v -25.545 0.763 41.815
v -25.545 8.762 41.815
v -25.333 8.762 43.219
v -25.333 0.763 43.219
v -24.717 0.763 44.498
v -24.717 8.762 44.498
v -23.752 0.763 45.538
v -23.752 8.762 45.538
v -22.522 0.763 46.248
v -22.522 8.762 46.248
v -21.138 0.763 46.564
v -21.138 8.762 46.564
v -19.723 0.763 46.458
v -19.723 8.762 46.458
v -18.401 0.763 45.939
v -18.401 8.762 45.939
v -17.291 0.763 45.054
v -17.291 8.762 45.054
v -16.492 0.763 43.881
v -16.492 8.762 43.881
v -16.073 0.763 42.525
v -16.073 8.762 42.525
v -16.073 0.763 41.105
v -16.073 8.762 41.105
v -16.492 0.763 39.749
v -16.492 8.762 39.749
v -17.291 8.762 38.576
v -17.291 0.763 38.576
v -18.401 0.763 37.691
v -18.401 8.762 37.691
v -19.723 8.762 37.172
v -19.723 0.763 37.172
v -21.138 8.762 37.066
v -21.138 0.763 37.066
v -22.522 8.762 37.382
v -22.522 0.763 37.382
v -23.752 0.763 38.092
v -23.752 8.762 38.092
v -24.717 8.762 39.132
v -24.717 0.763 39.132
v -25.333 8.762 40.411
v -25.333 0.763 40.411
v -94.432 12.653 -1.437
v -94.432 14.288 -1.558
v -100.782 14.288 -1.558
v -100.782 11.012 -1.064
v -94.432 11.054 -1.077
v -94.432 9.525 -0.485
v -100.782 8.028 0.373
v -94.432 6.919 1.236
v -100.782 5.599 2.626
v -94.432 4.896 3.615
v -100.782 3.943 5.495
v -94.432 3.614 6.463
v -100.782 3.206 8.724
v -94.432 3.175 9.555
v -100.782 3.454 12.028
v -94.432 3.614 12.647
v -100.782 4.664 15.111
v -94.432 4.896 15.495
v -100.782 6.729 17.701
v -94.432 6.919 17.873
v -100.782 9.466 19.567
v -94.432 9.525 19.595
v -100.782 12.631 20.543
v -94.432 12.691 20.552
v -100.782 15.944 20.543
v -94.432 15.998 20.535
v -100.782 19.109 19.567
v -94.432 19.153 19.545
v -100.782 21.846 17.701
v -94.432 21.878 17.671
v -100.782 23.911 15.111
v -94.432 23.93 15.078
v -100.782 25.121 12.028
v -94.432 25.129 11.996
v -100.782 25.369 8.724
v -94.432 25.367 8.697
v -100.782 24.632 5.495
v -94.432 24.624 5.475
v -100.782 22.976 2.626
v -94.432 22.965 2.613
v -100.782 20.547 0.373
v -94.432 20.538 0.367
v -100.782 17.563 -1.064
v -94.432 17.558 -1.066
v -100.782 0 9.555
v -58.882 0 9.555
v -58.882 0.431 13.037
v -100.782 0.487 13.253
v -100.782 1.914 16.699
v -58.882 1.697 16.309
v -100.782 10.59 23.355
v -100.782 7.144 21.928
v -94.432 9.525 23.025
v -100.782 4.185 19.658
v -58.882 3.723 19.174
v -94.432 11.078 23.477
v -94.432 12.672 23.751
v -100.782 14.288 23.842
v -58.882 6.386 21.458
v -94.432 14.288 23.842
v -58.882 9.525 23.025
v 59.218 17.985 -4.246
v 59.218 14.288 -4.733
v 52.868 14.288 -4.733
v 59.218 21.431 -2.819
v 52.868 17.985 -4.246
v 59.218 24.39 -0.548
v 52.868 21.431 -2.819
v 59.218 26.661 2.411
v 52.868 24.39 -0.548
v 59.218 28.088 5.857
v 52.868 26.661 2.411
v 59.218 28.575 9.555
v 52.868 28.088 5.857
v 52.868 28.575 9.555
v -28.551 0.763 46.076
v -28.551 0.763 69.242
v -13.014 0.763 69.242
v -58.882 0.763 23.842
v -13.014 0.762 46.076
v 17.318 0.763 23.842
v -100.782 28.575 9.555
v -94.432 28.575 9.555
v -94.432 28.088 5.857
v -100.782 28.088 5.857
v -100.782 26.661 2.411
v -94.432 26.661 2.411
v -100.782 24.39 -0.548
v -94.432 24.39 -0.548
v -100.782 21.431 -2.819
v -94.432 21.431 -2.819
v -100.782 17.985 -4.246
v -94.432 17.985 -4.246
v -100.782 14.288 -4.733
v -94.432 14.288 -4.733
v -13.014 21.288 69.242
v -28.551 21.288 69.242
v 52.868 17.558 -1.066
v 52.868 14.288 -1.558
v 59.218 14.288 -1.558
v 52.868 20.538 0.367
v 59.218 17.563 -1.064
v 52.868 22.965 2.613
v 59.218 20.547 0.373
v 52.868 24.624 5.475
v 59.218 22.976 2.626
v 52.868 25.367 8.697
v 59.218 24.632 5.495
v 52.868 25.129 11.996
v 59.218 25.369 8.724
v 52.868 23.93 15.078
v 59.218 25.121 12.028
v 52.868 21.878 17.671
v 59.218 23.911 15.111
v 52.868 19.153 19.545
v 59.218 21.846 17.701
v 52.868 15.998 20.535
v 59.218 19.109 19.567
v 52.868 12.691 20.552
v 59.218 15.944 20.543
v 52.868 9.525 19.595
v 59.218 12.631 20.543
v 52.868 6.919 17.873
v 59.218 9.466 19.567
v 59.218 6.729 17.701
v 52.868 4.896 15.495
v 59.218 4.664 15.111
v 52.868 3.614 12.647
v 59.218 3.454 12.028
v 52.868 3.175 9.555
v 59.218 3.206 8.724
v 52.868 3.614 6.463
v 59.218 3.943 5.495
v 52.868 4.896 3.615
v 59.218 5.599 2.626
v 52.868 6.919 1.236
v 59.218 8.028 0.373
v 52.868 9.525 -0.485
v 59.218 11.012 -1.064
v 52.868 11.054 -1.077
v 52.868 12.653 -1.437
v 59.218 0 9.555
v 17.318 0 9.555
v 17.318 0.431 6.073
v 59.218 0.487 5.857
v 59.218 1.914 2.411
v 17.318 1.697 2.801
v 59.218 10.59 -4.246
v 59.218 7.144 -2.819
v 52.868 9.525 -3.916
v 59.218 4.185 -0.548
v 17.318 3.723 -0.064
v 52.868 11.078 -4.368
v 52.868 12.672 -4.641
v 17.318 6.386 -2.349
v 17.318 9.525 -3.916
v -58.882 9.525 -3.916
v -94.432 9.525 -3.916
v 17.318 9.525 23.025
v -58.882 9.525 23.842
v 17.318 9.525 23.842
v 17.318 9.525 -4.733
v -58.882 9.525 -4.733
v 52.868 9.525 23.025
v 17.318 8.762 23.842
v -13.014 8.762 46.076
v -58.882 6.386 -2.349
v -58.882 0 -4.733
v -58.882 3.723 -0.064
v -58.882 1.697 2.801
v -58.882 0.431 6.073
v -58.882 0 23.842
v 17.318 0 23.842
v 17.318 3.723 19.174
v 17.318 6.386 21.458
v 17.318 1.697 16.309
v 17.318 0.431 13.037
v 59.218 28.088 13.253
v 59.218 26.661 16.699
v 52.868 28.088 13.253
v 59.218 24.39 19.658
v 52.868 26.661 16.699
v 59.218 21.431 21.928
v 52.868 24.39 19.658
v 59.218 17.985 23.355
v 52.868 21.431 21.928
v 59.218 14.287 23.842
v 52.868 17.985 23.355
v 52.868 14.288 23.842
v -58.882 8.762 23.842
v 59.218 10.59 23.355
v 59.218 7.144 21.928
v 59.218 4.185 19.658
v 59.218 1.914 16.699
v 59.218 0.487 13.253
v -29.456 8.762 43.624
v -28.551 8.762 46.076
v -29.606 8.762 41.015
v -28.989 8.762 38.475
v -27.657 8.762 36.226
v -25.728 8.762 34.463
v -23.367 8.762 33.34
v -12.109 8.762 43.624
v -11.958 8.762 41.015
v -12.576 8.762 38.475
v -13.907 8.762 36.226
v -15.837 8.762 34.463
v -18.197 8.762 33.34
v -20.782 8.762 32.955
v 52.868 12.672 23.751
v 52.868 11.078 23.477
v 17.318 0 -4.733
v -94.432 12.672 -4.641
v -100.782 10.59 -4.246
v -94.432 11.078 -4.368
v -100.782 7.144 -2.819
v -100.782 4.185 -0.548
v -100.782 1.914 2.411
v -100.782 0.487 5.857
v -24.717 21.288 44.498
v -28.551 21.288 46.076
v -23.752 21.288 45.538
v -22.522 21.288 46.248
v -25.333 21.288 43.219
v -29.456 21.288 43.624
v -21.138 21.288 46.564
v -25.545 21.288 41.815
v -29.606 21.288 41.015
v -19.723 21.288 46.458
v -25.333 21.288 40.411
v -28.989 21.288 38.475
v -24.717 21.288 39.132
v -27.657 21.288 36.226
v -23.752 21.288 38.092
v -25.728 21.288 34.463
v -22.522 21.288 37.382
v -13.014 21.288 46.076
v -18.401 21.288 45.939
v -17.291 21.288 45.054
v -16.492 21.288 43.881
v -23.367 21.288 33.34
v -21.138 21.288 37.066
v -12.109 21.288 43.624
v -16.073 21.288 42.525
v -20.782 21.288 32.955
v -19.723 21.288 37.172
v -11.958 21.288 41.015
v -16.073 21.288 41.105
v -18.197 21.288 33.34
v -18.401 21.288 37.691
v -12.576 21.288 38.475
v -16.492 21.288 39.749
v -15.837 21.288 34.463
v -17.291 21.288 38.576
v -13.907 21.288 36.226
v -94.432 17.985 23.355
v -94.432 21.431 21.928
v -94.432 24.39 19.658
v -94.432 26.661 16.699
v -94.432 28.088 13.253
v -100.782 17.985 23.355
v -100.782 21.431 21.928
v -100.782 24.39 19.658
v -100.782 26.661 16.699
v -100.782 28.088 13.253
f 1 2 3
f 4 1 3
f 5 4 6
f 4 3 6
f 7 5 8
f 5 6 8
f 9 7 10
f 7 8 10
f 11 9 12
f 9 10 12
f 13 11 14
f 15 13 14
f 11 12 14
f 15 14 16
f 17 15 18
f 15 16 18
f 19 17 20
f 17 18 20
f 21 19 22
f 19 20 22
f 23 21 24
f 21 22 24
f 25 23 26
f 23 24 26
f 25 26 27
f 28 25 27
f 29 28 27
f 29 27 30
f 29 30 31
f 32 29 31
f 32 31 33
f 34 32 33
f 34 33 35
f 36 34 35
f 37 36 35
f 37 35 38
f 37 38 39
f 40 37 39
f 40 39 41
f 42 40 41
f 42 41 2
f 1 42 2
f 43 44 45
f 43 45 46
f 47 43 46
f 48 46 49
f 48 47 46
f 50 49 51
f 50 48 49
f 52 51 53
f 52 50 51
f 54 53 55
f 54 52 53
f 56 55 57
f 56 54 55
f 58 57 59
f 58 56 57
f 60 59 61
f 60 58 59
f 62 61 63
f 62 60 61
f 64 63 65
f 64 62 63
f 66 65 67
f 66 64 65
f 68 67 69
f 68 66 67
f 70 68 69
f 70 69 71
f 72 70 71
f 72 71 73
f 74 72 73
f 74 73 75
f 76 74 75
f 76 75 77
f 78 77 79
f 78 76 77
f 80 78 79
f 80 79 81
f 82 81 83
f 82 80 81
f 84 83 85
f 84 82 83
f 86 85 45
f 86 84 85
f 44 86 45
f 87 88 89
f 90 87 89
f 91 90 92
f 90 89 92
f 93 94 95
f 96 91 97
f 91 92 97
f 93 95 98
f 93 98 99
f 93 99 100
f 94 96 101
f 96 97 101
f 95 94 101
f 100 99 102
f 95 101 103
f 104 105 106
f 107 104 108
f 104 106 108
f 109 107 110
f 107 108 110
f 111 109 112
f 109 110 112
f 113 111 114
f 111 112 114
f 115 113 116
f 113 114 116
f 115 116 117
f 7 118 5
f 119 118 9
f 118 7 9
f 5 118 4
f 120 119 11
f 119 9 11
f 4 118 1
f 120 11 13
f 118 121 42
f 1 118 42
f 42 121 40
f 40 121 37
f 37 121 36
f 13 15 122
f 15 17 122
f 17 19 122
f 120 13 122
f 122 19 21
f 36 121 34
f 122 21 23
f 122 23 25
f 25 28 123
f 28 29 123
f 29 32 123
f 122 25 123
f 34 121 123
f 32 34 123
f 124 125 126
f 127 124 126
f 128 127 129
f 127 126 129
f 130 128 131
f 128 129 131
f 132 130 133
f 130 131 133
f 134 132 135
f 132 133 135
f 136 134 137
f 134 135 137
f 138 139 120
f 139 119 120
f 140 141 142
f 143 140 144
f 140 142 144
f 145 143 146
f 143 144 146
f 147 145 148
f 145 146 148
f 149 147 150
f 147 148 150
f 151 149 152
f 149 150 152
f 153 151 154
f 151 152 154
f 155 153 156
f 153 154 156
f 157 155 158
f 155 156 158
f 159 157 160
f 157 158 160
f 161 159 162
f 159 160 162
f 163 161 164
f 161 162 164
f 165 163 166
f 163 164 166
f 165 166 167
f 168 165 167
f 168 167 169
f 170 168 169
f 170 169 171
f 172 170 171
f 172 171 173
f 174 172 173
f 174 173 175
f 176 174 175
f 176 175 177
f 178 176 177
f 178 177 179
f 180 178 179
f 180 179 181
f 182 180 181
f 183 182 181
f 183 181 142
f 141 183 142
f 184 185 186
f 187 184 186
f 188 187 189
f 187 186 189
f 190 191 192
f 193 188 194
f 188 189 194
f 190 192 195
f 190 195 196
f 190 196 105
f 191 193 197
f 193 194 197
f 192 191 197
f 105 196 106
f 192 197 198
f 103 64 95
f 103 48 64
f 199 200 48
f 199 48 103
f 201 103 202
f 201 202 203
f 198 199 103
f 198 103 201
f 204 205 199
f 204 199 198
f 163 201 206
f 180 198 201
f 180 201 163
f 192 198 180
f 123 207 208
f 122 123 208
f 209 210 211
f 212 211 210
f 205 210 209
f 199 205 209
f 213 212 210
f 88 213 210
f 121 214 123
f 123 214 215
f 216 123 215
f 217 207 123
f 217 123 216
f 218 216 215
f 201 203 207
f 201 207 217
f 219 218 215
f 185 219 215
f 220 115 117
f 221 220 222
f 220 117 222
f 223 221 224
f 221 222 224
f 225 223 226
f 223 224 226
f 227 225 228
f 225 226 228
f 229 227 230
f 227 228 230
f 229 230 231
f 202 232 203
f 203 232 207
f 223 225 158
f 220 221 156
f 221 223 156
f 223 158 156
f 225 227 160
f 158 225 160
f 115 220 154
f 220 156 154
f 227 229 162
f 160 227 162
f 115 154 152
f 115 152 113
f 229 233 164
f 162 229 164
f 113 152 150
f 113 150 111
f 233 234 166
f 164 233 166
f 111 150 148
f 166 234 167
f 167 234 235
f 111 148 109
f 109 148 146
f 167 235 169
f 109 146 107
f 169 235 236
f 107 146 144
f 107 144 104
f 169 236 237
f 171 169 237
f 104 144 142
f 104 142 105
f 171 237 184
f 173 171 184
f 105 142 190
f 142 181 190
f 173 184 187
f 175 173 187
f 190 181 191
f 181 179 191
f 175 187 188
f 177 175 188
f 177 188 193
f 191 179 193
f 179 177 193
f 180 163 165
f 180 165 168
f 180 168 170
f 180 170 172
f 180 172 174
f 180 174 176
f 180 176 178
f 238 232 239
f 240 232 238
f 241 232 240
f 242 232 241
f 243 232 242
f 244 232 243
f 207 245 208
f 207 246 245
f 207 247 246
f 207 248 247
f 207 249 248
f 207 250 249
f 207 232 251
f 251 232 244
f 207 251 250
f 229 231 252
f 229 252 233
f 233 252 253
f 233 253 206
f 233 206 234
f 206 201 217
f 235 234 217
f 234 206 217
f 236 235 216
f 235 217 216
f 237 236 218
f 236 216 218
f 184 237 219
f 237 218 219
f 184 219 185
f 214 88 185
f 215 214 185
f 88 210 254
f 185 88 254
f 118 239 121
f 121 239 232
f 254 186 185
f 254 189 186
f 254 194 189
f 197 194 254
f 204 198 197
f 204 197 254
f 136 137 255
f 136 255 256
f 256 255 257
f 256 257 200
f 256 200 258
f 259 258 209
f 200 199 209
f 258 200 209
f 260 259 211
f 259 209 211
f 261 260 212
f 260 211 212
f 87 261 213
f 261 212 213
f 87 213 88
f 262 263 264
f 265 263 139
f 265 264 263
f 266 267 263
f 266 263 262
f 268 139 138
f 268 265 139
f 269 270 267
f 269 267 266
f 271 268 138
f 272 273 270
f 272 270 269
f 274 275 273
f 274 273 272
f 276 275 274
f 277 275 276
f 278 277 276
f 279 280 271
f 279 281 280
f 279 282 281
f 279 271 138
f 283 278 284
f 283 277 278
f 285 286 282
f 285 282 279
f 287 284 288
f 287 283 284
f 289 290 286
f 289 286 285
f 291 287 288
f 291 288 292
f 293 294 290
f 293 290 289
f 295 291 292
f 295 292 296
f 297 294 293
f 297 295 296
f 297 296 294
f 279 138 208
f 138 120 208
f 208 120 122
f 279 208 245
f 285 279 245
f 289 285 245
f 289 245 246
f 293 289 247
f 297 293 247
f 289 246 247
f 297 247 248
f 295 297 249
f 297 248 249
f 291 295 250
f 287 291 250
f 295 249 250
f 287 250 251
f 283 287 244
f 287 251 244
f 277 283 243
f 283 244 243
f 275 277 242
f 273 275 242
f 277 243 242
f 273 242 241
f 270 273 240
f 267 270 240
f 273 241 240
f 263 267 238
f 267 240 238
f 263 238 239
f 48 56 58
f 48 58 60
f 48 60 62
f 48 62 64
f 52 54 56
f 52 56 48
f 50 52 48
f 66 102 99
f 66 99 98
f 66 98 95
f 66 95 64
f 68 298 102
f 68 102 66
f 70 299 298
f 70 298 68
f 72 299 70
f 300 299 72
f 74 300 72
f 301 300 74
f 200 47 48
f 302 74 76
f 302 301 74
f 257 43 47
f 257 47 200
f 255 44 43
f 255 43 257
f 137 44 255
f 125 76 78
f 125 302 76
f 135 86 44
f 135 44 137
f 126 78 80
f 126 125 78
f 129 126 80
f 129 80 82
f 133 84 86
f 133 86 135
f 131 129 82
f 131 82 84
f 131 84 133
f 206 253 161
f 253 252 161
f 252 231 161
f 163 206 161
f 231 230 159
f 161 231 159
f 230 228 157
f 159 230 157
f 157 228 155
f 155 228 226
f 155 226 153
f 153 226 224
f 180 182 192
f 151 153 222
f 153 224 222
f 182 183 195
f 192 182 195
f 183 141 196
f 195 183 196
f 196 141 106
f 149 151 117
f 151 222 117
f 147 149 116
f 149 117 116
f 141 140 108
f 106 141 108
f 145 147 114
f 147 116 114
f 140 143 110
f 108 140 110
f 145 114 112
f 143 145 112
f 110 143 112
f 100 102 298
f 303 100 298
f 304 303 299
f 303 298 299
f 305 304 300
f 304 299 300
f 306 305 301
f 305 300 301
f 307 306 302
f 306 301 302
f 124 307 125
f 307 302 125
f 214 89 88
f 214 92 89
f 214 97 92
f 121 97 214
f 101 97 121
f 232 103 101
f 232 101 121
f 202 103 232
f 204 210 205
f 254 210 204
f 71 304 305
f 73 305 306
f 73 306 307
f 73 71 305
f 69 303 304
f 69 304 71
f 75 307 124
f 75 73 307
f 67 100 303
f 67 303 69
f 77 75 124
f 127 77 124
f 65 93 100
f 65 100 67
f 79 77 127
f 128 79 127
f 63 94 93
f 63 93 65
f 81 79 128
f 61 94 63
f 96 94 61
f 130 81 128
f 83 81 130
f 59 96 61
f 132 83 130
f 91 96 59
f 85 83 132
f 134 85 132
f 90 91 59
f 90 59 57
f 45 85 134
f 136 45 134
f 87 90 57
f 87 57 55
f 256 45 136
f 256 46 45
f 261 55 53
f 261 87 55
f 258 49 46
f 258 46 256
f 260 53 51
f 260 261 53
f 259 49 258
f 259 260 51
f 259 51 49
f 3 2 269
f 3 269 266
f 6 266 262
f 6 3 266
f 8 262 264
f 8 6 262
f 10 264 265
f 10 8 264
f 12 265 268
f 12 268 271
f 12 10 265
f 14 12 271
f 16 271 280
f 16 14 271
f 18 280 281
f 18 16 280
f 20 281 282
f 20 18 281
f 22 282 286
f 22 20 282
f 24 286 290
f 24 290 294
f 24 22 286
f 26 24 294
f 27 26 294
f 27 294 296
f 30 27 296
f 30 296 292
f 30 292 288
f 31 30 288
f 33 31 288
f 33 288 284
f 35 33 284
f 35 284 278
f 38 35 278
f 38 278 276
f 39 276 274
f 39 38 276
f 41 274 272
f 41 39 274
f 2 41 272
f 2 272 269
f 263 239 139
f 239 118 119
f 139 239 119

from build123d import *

# Parameters (mm, degrees)
SKETCH1_W           = 160
SKETCH1_H           = 28.575
BOSS_EXTRUDE1_DEPTH = 28.575
SKETCH3_W           = 147.3
SKETCH3_H           = 28.575
CUT_EXTRUDE3_DEPTH  = 19.05
SKETCH4_W           = 76.2
SKETCH4_H           = 8
BOSS_EXTRUDE2_DEPTH = 45.4
CUT_EXTRUDE8_DEPTH  = 124.871382326
SKETCH9_R           = 4.7625
BOSS_EXTRUDE4_DEPTH = 12.525
SKETCH10_R          = 4.7625
CUT_EXTRUDE10_DEPTH = 124.871382326
CUT_EXTRUDE11_START = -41.9
SKETCH2_OUTSIDE_W   = 111.689
SKETCH2_OUTSIDE_H   = 66.289
SKETCH2_OUTSIDE_R   = 14.2875
CUT_EXTRUDE11_DEPTH = 41.9
CUT_EXTRUDE13_START = -41.9
SKETCH13_OUTSIDE_W  = 111.689
SKETCH13_OUTSIDE_H  = 66.289
SKETCH13_OUTSIDE_R  = 14.2875
CUT_EXTRUDE13_DEPTH = 41.9
SKETCH14_R          = 11.1125
CUT_EXTRUDE14_DEPTH = 6.35
CUT_EXTRUDE15_START = -6.35
SKETCH15_R          = 11.1125
CUT_EXTRUDE15_DEPTH = 6.35


with BuildPart() as part:
    # Sketch1 → Boss-Extrude1 (new body)
    with BuildSketch(Plane(origin=(0, 0, 0), x_dir=(1, 0, 0), z_dir=(0, 1, 0))):
        with Locations((-20.782379652, -9.554800327)):
            Rectangle(SKETCH1_W, SKETCH1_H)
    extrude(amount=BOSS_EXTRUDE1_DEPTH)

    # Sketch3 → Cut-Extrude3 (cut)
    with BuildSketch(Plane(origin=(0, 28.575, 0), x_dir=(1, 0, 0), z_dir=(0, 1, 0))):
        with Locations((-20.782379652, -9.554800327)):
            Rectangle(SKETCH3_W, SKETCH3_H)
    extrude(amount=-CUT_EXTRUDE3_DEPTH, mode=Mode.SUBTRACT)

    # Sketch4 → Boss-Extrude2 (add)
    with BuildSketch(Plane.XY.offset(23.842300327)):
        with Locations((-20.782379652, 4.7625)):
            Rectangle(SKETCH4_W, SKETCH4_H)
    extrude(amount=BOSS_EXTRUDE2_DEPTH)

    # Sketch5 → Cut-Extrude8 (cut, through all)
    with BuildSketch(Plane(origin=(0, 8.7625, 0), x_dir=(1, 0, 0), z_dir=(0, 1, 0))):
        Polygon((-13.013921372, -46.075787503), (-13.013921372, -69.242300327), (17.317620348, -69.242300327), (17.317620348, -23.842300327), align=None)
        Polygon((-28.550837933, -69.242300327), (-28.550837933, -46.075787503), (-58.882379652, -23.842300327), (-58.882379652, -69.242300327), align=None)
    extrude(amount=-CUT_EXTRUDE8_DEPTH, mode=Mode.SUBTRACT)

    # Sketch9 → Boss-Extrude4 (add)
    with BuildSketch(Plane(origin=(0, 8.7625, 0), x_dir=(1, 0, 0), z_dir=(0, 1, 0))):
        with BuildLine():
            Line((-28.550837933, -46.075787503), (-28.550837933, -69.242300327))
            Line((-28.550837933, -69.242300327), (-13.013921372, -69.242300327))
            Line((-13.013921372, -69.242300327), (-13.013921372, -46.075787503))
            ThreePointArc((-13.013921372, -46.075787503), (-20.782379652, -32.954800327), (-28.550837933, -46.075787503))
        make_face()
        with Locations(Location((-20.782379652, -41.815004419, 0), (0, 0, 180))):
            Circle(SKETCH9_R, mode=Mode.SUBTRACT)
    extrude(amount=BOSS_EXTRUDE4_DEPTH)

    # Sketch10 → Cut-Extrude10 (cut, through all)
    with BuildSketch(Plane(origin=(0, 8.7625, 0), x_dir=(1, 0, 0), z_dir=(0, 1, 0))):
        with Locations(Location((-20.782379652, -41.815004419, 0), (0, 0, 180))):
            Circle(SKETCH10_R)
    extrude(amount=-CUT_EXTRUDE10_DEPTH, mode=Mode.SUBTRACT)

    # Sketch2 outside → Cut-Extrude11 (cut)
    with BuildSketch(Plane(origin=(59.217620348, 0, 0), x_dir=(0, 0, -1), z_dir=(1, 0, 0)).offset(CUT_EXTRUDE11_START)):
        with Locations((-32.2545, 14.2875)):
            Rectangle(SKETCH2_OUTSIDE_W, SKETCH2_OUTSIDE_H)
        with Locations((-9.554800327, 14.2875)):
            Circle(SKETCH2_OUTSIDE_R, mode=Mode.SUBTRACT)
    extrude(amount=CUT_EXTRUDE11_DEPTH, mode=Mode.SUBTRACT)

    # Sketch13 outside → Cut-Extrude13 (cut)
    with BuildSketch(Plane.ZY.offset(100.782379652).offset(CUT_EXTRUDE13_START)):
        with Locations((32.2545, 14.2875)):
            Rectangle(SKETCH13_OUTSIDE_W, SKETCH13_OUTSIDE_H)
        with Locations(Location((9.554800327, 14.2875, 0), (0, 0, 180))):
            Circle(SKETCH13_OUTSIDE_R, mode=Mode.SUBTRACT)
    extrude(amount=CUT_EXTRUDE13_DEPTH, mode=Mode.SUBTRACT)

    # Sketch14 → Cut-Extrude14 (cut)
    with BuildSketch(Plane(origin=(59.217620348, 0, 0), x_dir=(0, 0, -1), z_dir=(1, 0, 0))):
        with Locations((-9.554800327, 14.2875)):
            Circle(SKETCH14_R)
    extrude(amount=-CUT_EXTRUDE14_DEPTH, mode=Mode.SUBTRACT)

    # Sketch15 → Cut-Extrude15 (cut)
    with BuildSketch(Plane.ZY.offset(100.782379652).offset(CUT_EXTRUDE15_START)):
        with Locations(Location((9.554800327, 14.2875, 0), (0, 0, 180))):
            Circle(SKETCH15_R)
    extrude(amount=CUT_EXTRUDE15_DEPTH, mode=Mode.SUBTRACT)


solid = part.part
